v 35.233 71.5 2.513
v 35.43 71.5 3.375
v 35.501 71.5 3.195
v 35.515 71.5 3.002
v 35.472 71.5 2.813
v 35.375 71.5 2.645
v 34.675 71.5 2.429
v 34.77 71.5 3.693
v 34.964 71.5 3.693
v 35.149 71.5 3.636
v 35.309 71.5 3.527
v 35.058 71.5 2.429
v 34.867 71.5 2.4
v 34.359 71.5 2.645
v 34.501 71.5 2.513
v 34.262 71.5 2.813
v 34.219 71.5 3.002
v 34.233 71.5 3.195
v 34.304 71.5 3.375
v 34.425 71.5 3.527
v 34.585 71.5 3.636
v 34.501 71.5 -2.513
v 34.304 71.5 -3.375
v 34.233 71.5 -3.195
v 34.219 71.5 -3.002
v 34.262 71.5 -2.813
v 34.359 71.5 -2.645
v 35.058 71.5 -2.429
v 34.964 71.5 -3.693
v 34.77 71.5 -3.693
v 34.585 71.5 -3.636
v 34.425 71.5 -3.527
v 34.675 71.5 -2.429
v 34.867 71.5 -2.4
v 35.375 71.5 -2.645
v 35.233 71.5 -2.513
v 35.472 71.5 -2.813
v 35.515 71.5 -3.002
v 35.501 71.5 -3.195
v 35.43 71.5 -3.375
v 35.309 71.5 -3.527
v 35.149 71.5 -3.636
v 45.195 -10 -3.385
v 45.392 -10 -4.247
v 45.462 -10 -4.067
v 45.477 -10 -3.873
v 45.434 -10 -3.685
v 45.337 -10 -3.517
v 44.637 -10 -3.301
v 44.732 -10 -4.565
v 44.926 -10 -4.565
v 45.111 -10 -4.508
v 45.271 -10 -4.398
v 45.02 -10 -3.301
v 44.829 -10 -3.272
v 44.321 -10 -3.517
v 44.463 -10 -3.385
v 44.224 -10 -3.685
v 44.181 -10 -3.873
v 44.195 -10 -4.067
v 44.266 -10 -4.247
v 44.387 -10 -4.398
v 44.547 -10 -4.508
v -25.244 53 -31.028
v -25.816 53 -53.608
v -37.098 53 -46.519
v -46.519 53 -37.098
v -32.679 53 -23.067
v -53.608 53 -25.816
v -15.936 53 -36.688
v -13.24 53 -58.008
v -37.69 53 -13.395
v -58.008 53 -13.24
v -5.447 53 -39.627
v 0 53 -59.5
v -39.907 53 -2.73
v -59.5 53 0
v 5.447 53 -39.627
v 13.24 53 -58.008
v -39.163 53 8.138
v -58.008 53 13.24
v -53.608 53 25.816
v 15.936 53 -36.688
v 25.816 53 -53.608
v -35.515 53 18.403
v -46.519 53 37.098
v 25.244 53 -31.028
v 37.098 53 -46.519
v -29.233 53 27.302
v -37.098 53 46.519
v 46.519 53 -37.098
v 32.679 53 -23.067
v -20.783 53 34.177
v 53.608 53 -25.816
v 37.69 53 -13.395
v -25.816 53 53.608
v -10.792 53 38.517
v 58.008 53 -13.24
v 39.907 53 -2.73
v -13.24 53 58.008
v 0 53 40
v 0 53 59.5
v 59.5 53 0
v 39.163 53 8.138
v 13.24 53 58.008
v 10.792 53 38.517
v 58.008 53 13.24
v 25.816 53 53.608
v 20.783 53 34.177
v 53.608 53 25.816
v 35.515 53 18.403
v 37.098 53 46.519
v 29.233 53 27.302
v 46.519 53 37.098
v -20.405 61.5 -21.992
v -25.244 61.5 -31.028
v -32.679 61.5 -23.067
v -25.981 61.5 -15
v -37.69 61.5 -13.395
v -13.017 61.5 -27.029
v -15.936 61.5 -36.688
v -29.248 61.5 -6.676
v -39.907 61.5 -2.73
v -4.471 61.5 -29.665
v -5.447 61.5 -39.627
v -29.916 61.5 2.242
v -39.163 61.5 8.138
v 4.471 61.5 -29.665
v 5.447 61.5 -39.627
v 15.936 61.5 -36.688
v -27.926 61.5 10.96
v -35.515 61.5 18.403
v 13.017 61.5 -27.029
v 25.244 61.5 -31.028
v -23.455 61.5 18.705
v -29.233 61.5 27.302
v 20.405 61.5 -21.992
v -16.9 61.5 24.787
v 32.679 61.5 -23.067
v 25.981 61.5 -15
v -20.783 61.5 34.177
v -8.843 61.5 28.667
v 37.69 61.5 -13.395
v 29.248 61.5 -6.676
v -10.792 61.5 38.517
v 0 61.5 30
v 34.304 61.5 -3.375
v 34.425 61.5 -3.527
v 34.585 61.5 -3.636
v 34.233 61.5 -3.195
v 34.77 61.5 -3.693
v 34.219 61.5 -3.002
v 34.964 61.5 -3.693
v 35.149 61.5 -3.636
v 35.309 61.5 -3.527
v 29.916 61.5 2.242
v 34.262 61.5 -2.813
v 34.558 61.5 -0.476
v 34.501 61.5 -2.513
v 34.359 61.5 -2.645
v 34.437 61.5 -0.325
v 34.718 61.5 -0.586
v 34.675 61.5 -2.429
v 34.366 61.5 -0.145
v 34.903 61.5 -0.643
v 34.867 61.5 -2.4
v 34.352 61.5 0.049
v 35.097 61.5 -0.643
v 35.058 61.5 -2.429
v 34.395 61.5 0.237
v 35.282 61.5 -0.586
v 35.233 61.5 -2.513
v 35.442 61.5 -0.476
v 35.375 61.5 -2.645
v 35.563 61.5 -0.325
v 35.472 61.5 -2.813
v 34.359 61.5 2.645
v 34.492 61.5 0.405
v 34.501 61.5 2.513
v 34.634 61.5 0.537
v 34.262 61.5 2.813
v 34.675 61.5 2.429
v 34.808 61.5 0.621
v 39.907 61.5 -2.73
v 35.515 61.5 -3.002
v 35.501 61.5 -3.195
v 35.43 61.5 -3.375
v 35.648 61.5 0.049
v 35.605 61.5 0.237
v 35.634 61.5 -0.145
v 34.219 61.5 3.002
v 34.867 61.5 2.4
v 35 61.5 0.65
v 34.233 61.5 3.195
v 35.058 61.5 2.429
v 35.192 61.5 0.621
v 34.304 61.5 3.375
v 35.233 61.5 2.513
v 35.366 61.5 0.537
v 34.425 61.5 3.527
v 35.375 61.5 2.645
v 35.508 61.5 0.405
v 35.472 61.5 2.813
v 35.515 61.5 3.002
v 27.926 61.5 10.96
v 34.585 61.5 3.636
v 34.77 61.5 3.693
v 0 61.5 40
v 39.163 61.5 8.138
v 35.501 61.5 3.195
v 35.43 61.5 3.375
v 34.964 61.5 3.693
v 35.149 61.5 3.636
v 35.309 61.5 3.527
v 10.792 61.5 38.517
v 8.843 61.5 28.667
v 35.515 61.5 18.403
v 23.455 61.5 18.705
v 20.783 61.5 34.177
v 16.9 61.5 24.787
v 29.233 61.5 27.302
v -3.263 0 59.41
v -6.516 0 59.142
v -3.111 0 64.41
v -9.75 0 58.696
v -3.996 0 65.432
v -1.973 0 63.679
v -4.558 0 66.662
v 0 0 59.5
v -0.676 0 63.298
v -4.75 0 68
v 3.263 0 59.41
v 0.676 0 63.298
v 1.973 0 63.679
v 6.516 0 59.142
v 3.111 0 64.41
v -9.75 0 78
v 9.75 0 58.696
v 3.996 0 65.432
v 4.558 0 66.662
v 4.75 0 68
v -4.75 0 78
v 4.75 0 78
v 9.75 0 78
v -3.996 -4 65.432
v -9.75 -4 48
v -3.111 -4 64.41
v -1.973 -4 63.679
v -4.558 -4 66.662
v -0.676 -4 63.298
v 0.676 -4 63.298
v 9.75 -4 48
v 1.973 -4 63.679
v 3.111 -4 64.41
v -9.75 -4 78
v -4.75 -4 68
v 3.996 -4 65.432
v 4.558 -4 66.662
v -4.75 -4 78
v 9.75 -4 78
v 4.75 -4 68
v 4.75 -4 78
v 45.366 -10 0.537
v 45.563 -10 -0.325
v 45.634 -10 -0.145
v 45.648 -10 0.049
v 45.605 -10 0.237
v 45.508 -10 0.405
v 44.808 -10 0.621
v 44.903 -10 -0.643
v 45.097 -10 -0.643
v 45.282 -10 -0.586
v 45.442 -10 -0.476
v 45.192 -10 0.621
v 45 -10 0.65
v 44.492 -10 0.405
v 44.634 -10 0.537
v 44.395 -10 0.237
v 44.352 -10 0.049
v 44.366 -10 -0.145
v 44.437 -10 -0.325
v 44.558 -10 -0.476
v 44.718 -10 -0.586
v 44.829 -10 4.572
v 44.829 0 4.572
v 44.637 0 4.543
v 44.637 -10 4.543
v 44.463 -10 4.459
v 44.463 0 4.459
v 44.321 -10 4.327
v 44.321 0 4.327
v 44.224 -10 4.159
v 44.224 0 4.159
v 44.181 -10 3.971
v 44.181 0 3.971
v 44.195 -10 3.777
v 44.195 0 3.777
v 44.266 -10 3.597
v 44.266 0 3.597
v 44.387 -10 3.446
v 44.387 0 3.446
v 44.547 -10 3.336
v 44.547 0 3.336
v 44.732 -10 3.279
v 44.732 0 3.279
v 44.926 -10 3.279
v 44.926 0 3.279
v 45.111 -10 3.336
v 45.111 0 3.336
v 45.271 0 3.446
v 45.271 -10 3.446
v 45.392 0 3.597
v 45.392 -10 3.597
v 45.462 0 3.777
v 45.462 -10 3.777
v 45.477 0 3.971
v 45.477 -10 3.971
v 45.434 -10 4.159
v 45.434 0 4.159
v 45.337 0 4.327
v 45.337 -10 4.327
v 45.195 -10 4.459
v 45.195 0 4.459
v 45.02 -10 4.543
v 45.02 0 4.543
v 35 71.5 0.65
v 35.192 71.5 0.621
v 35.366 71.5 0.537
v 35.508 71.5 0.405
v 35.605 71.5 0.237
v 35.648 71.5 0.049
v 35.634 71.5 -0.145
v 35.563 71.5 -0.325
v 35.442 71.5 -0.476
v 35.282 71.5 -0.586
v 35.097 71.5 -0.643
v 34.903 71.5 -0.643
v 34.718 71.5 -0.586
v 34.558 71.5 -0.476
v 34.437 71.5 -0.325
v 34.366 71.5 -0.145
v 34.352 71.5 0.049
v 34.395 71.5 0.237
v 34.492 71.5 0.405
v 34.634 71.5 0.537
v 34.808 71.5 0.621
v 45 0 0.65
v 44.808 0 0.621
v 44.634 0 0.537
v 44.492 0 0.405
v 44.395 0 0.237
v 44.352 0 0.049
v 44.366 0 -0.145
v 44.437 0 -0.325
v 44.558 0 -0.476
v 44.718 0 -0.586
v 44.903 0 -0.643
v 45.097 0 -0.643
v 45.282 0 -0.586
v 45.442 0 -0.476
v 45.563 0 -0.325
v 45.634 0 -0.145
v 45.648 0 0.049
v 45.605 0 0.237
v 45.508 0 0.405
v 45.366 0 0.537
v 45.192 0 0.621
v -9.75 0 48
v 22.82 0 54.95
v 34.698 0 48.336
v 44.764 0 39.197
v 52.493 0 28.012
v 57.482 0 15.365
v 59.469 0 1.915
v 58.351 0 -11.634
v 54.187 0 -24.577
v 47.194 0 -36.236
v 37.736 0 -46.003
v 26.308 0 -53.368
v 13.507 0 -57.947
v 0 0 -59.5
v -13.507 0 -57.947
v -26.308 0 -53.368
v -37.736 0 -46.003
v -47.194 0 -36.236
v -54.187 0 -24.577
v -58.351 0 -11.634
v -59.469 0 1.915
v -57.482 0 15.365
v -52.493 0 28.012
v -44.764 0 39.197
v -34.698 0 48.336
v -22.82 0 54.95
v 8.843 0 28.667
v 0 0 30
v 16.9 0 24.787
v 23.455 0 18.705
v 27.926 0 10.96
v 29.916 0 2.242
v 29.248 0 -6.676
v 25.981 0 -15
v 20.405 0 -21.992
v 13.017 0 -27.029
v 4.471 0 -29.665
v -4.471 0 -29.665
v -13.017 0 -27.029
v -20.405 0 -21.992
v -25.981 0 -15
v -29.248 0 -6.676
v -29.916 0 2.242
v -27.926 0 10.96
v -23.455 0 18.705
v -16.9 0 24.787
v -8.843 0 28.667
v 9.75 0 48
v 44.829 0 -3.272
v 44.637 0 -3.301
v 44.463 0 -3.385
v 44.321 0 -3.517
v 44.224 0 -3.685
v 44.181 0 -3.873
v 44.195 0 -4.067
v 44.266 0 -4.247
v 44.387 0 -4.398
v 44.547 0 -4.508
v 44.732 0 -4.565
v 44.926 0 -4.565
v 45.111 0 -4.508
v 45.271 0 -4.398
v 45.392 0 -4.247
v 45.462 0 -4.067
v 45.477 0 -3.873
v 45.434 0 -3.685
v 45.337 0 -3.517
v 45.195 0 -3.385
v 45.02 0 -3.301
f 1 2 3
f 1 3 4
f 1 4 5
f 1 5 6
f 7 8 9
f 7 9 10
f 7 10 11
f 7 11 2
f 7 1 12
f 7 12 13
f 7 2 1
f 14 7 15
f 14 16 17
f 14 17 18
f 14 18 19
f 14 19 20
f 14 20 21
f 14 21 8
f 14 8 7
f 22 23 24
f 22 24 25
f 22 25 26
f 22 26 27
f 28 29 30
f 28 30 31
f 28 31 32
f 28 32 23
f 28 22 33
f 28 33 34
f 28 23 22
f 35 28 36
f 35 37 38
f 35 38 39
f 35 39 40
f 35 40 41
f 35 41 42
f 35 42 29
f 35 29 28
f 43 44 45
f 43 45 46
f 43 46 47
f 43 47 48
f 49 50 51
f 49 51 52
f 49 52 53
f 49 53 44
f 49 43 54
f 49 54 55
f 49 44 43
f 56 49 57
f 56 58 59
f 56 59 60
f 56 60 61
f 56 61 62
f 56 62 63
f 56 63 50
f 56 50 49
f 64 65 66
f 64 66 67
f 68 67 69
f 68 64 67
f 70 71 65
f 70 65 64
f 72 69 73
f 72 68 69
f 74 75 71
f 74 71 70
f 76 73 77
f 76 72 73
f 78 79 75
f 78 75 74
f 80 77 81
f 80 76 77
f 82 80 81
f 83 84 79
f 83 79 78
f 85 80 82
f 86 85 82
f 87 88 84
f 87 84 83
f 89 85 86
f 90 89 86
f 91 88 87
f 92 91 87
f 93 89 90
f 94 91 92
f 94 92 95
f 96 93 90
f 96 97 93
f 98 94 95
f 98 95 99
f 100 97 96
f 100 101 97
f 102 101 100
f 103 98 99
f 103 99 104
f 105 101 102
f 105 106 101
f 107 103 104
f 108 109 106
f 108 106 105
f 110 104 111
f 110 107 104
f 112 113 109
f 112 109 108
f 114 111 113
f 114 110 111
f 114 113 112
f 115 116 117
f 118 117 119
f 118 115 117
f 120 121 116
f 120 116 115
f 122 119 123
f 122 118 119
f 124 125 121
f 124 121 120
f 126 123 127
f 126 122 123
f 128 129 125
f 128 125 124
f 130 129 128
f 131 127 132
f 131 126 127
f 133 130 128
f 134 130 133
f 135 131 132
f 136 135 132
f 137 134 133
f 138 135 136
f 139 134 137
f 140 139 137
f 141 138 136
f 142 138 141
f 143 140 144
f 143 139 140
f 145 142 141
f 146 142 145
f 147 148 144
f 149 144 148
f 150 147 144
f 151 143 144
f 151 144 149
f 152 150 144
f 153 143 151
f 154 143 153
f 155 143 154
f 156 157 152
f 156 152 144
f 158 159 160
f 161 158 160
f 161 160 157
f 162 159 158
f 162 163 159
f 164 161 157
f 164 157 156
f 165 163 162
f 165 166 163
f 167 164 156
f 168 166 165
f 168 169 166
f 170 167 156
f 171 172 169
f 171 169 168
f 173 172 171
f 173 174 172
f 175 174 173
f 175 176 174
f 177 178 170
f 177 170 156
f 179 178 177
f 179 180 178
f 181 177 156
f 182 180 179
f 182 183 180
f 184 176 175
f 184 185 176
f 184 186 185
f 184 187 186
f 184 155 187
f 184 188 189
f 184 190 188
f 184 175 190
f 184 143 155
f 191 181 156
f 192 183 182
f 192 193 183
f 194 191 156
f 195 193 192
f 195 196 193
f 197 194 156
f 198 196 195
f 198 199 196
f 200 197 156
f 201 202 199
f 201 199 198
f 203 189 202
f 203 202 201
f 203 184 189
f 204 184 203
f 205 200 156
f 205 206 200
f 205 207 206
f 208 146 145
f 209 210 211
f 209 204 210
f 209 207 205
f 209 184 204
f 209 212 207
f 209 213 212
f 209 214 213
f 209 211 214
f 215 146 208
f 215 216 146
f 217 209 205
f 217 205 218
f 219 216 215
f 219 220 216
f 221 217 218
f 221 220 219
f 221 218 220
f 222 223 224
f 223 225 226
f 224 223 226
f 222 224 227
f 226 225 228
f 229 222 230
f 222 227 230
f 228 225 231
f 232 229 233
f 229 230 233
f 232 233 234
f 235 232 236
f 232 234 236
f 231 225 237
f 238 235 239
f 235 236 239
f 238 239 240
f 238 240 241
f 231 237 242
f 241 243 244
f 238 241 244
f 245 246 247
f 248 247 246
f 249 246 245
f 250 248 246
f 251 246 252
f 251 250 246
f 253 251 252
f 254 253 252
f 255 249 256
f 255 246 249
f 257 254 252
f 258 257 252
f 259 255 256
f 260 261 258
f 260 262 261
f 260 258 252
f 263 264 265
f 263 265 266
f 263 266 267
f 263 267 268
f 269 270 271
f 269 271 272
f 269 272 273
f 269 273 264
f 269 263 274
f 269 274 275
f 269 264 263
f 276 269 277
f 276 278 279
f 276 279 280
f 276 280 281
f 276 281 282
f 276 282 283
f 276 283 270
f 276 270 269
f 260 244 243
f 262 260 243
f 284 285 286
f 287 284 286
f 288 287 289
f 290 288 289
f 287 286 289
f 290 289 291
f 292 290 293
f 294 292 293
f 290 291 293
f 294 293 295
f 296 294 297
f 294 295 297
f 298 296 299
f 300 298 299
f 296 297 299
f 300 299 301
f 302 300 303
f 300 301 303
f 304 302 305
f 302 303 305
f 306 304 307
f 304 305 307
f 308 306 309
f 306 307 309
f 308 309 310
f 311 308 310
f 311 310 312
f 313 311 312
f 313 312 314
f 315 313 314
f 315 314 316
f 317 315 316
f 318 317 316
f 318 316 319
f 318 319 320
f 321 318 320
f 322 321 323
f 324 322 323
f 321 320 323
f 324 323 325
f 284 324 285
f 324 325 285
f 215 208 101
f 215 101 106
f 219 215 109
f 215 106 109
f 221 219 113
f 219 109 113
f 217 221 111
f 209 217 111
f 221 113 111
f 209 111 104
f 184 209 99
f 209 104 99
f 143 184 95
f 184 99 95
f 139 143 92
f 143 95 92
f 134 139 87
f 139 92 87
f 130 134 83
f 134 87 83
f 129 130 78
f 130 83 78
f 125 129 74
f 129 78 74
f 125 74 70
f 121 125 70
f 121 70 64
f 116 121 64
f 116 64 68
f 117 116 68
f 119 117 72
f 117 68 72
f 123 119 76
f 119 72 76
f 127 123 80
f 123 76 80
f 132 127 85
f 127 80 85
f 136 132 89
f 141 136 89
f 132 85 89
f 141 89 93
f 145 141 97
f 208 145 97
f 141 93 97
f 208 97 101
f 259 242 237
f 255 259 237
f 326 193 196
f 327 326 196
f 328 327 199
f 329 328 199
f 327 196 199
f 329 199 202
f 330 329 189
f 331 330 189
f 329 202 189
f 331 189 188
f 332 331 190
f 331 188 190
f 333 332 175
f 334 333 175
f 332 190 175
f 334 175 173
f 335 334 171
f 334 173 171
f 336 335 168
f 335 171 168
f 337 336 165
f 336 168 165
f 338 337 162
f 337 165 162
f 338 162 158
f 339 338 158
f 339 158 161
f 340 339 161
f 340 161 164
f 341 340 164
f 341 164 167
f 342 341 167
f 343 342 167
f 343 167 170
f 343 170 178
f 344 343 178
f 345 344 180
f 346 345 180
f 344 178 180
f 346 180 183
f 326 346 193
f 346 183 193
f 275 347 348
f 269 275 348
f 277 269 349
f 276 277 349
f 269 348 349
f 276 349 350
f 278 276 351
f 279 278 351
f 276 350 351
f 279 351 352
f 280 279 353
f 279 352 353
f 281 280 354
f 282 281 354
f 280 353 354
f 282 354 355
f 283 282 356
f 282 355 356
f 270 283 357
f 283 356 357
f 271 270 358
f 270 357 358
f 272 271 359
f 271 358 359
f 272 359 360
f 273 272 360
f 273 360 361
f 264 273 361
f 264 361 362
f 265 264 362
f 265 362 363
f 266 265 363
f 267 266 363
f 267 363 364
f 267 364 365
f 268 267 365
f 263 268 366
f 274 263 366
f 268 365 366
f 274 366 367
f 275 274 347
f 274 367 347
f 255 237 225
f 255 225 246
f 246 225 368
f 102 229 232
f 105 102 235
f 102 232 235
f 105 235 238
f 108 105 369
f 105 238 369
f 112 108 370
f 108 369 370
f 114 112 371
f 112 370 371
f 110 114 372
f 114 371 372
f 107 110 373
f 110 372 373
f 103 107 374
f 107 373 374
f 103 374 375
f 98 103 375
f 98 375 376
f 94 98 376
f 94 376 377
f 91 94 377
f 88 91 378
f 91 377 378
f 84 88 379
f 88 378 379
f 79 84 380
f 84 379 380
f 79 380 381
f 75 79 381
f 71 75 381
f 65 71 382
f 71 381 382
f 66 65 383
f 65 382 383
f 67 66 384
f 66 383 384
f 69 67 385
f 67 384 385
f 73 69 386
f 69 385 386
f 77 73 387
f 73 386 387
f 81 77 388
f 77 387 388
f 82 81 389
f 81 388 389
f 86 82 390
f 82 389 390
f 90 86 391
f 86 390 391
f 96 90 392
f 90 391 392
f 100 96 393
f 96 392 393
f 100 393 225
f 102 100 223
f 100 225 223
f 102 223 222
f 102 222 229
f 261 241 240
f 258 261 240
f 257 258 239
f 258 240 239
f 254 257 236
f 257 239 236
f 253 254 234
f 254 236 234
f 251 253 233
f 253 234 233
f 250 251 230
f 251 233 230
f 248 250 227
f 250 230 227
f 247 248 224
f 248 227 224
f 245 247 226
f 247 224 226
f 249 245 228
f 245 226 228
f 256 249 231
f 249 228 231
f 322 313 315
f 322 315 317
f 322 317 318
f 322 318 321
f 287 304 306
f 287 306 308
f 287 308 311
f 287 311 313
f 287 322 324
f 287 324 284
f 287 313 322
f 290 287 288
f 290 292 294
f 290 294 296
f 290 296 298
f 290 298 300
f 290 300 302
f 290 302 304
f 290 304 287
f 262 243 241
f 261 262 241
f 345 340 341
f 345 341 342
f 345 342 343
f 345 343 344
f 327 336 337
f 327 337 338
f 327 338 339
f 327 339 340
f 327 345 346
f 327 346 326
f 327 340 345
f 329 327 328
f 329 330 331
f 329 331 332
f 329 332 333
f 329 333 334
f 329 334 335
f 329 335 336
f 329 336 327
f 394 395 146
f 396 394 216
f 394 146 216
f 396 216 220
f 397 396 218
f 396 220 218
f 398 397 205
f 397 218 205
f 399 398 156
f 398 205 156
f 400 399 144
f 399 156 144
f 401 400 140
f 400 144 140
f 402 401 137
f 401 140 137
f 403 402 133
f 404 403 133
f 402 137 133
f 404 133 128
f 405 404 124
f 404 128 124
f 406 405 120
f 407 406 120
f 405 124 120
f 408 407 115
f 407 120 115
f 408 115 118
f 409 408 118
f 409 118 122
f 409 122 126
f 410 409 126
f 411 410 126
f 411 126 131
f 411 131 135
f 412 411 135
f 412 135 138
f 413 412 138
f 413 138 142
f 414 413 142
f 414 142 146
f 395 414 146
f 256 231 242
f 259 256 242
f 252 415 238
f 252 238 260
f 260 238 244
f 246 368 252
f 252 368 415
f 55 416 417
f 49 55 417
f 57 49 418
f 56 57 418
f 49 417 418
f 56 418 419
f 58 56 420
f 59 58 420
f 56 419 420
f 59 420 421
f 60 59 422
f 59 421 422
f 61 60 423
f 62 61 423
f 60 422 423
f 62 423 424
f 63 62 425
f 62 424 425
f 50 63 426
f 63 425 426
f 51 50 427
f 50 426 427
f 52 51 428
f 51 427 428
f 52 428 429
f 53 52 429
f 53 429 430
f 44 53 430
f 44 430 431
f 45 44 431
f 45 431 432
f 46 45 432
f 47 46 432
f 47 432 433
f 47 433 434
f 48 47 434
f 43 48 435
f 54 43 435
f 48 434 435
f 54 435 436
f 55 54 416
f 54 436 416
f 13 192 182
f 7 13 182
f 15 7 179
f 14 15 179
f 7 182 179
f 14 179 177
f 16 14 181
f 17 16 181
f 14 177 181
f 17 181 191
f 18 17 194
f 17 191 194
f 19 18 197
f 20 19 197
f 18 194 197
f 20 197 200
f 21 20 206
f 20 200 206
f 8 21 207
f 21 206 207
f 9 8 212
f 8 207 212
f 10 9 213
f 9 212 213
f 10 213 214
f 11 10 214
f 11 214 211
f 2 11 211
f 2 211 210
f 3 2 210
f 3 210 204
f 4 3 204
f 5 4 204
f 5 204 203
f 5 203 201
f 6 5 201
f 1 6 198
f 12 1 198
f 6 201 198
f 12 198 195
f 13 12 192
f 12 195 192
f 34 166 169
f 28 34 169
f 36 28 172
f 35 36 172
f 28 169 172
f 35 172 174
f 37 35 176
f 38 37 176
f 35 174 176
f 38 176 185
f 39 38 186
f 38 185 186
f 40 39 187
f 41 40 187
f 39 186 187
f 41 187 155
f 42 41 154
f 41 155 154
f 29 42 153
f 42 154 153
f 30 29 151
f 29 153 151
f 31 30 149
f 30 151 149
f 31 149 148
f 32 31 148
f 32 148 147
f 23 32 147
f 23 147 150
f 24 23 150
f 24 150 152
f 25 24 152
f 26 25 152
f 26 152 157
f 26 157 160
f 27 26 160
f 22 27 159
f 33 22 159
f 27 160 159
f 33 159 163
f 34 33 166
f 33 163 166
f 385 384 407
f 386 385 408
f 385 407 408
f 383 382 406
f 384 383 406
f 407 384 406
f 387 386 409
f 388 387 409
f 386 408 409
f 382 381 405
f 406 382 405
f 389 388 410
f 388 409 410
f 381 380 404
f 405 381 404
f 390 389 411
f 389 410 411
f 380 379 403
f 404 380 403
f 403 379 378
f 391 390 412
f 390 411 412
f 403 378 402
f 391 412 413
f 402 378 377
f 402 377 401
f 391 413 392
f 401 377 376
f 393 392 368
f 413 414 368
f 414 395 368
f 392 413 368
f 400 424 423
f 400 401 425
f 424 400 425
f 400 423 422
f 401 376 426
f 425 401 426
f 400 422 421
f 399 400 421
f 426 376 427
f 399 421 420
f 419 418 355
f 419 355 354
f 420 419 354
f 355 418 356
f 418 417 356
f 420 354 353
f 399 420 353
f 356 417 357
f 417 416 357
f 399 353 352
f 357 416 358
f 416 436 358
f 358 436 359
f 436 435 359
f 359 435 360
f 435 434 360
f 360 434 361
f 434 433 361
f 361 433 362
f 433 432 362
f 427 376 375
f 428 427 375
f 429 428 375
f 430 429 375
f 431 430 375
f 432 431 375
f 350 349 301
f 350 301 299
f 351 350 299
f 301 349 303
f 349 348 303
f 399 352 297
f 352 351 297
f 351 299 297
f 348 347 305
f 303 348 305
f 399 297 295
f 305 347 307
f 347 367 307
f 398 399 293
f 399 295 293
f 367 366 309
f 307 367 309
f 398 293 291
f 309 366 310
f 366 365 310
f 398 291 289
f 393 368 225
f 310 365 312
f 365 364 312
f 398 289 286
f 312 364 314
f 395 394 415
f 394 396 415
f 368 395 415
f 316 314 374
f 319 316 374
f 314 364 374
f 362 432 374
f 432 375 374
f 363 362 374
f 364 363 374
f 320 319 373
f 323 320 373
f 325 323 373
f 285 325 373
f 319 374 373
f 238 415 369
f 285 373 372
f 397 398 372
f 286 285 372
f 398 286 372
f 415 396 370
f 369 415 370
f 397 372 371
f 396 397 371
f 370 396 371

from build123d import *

# Parameters (mm, degrees)
CROQUIS1_R              = 59.5
SALIENTE_EXTRUIR1_DEPTH = 53
CROQUIS2_R              = 40
SALIENTE_EXTRUIR2_DEPTH = 8.5
CORTAR_EXTRUIR1_REACH   = 106.225
CROQUIS4_R              = 30
CROQUIS5_R              = 0.65
SALIENTE_EXTRUIR3_DEPTH = 10
CROQUIS6_R              = 0.65
SALIENTE_EXTRUIR4_DEPTH = 10
SALIENTE_EXTRUIR5_DEPTH = 4


with BuildPart() as part:
    # Croquis1 → Saliente-Extruir1 (new body)
    with BuildSketch(Plane(origin=(0, 0, 0), x_dir=(1, 0, 0), z_dir=(0, 1, 0))):
        with Locations(Location((0, 0, 0), (0, 0, 270))):
            Circle(CROQUIS1_R)
    extrude(amount=SALIENTE_EXTRUIR1_DEPTH)

    # Croquis2 → Saliente-Extruir2 (add)
    with BuildSketch(Plane(origin=(0, 53, 0), x_dir=(1, 0, 0), z_dir=(0, 1, 0))):
        with Locations(Location((0, 0, 0), (0, 0, 270))):
            Circle(CROQUIS2_R)
    extrude(amount=SALIENTE_EXTRUIR2_DEPTH)

    # Croquis4 → Cortar-Extruir1 (cut, up to next)
    with BuildSketch(Plane(origin=(0, 61.5, 0), x_dir=(1, 0, 0), z_dir=(0, 1, 0)), mode=Mode.PRIVATE) as cortar_extruir1_sk1:
        with Locations(Location((0, 0, 0), (0, 0, 270))):
            Circle(CROQUIS4_R)
    cortar_extruir1_tool1 = extrude(cortar_extruir1_sk1.sketch, amount=-CORTAR_EXTRUIR1_REACH, mode=Mode.PRIVATE) & part.part
    add(cortar_extruir1_tool1.solids().sort_by_distance((0, 61.5, 0))[0], mode=Mode.SUBTRACT)

    # Croquis5 → Saliente-Extruir3 (add)
    with BuildSketch(Plane(origin=(0, 61.5, 0), x_dir=(1, 0, 0), z_dir=(0, 1, 0))):
        with Locations(Location((35, 0, 0), (0, 0, 270))):
            Circle(CROQUIS5_R)
        with Locations(Location((34.866814433, 3.050450996, 0), (0, 0, 270))):
            Circle(CROQUIS5_R)
        with Locations(Location((34.866814433, -3.050450996, 0), (0, 0, 90))):
            Circle(CROQUIS5_R)
    extrude(amount=SALIENTE_EXTRUIR3_DEPTH)

    # Croquis6 → Saliente-Extruir4 (add)
    with BuildSketch(Plane.XZ):
        with Locations(Location((45, 0, 0), (0, 0, 90))):
            Circle(CROQUIS6_R)
        with Locations(Location((44.828761414, 3.922008424, 0), (0, 0, 90))):
            Circle(CROQUIS6_R)
        with Locations(Location((44.828761414, -3.922008424, 0), (0, 0, 90))):
            Circle(CROQUIS6_R)
    extrude(amount=SALIENTE_EXTRUIR4_DEPTH)

    # Croquis10 → Saliente-Extruir5 (add)
    with BuildSketch(Plane.XZ):
        with BuildLine():
            ThreePointArc((4.75, 68), (0, 63.25), (-4.75, 68))
            Line((-4.75, 68), (-4.75, 78))
            Line((-4.75, 78), (-9.75, 78))
            Line((-9.75, 78), (-9.75, 48))
            Line((-9.75, 48), (9.75, 48))
            Line((9.75, 48), (9.75, 78))
            Line((9.75, 78), (4.75, 78))
            Line((4.75, 78), (4.75, 68))
        make_face()
    extrude(amount=SALIENTE_EXTRUIR5_DEPTH)


solid = part.part
